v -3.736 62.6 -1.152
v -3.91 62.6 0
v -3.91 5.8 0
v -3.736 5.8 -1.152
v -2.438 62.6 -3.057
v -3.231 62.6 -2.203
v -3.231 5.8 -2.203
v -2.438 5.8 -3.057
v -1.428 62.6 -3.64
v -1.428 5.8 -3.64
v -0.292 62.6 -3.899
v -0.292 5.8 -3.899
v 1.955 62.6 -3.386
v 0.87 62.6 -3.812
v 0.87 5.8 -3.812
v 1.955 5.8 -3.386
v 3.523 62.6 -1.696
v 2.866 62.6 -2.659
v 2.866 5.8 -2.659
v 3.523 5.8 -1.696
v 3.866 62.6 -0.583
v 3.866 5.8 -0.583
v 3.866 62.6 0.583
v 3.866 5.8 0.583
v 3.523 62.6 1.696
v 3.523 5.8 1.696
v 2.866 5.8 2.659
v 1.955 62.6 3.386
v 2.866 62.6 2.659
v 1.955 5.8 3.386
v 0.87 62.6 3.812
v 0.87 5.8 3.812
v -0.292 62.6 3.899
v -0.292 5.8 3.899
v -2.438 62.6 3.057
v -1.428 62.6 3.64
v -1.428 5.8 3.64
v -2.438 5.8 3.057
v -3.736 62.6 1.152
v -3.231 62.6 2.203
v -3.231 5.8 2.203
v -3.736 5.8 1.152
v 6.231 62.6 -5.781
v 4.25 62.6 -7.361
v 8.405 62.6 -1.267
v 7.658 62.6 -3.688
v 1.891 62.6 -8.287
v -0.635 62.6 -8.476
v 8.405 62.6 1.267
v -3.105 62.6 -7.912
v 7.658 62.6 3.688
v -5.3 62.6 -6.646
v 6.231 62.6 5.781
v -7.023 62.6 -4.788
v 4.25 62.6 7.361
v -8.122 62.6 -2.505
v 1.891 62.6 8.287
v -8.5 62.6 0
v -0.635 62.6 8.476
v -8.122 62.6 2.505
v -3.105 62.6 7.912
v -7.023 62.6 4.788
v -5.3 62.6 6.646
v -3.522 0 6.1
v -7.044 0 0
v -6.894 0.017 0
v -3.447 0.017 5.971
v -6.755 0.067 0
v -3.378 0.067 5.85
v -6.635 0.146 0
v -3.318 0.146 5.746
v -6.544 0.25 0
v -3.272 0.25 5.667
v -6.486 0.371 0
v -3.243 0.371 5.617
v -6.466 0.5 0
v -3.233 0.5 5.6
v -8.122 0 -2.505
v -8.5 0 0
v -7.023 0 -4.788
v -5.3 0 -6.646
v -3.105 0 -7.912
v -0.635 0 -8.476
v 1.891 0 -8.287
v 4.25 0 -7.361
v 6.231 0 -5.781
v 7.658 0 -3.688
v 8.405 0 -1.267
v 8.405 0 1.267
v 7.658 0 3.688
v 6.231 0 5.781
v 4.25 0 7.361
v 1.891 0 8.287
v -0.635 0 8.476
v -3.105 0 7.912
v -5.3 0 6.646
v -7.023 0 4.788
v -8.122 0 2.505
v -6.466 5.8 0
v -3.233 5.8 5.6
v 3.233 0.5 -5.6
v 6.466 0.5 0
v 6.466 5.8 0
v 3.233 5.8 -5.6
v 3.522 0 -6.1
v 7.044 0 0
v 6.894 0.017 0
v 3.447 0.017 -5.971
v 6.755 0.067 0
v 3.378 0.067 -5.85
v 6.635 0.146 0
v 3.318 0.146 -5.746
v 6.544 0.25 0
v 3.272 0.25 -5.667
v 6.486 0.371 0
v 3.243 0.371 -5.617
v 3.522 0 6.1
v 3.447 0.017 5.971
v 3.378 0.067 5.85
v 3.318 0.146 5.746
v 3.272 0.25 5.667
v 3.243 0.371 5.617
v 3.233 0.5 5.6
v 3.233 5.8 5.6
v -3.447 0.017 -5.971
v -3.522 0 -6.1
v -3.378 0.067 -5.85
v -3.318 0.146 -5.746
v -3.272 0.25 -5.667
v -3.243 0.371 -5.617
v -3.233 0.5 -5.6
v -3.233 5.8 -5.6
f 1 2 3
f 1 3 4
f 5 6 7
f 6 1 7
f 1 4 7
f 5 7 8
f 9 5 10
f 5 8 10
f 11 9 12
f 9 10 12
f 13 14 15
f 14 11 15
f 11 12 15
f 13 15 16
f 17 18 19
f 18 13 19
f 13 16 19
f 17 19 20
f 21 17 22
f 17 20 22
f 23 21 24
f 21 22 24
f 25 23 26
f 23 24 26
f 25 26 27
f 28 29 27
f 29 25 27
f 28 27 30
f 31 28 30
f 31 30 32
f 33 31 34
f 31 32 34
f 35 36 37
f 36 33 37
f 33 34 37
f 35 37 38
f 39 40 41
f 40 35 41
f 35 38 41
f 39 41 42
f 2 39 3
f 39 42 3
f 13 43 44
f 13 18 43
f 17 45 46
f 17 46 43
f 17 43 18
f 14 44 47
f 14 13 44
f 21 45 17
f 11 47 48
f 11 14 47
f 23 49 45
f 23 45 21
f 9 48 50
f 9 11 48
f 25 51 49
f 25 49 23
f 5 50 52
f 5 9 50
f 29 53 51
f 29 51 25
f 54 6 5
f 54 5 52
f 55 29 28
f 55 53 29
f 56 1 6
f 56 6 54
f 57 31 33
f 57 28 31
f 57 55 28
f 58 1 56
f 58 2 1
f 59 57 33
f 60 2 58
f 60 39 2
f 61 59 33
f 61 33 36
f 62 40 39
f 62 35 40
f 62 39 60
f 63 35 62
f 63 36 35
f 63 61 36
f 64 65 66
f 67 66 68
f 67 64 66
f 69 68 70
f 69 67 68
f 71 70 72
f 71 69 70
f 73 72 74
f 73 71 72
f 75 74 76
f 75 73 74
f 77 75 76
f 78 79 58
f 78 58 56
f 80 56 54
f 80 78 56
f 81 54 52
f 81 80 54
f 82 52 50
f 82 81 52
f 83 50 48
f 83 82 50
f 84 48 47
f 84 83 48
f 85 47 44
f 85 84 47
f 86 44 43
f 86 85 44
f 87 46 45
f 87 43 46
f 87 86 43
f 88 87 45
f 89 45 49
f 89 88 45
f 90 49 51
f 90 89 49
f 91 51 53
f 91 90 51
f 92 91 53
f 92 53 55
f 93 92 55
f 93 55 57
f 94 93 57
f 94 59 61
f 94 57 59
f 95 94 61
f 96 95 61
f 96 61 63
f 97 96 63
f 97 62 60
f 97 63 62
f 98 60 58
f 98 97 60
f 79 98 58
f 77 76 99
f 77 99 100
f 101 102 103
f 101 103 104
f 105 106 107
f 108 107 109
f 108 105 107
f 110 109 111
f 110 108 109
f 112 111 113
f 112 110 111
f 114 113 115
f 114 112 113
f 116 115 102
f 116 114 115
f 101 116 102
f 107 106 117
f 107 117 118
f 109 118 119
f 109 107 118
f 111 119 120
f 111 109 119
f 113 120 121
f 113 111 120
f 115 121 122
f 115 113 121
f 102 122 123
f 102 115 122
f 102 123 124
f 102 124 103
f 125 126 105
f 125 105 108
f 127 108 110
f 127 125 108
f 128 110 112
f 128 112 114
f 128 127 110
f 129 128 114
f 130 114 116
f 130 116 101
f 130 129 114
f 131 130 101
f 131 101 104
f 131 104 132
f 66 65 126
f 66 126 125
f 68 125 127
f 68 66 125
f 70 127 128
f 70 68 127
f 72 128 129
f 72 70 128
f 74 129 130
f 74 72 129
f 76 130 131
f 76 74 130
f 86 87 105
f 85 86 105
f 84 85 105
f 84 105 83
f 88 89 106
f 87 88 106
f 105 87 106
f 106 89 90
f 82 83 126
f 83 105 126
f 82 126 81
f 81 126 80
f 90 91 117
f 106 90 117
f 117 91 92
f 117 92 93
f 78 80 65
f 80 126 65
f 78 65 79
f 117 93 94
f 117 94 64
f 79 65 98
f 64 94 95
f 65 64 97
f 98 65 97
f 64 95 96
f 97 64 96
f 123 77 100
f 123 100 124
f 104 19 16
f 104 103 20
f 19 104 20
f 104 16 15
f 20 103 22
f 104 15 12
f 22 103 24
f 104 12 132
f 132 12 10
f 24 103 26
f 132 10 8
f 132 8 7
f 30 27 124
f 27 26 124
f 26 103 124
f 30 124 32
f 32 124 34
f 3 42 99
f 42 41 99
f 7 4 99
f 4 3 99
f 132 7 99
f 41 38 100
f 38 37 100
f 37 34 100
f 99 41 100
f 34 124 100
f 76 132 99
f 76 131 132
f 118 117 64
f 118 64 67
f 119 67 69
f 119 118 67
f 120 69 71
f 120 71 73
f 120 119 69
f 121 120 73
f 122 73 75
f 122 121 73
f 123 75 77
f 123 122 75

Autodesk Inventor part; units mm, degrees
ref_plane "YZ Plane" through (0, 0, 0) normal (1, 0, 0) x (0, 1, 0)
ref_plane "XZ Plane" through (0, 0, 0) normal (0, 1, 0) x (-1, 0, 0)
ref_plane "XY Plane" through (0, 0, 0) normal (0, 0, 1) x (1, 0, 0)
sketch "Sketch1" plane through (0, 0, 0) normal (0, 1, 0) x (-1, 0, 0)
  circle A0 centre (0, 0) radius 3.91
  circle A1 centre (0, 0) radius 8.5
  line L0 (5.7735, 0) -> (2.8868, -5) construction
  line L1 (2.8868, -5) -> (-2.8868, -5) construction
  line L2 (-2.8868, -5) -> (-5.7735, 0) construction
  line L3 (-5.7735, 0) -> (-2.8868, 5) construction
  line L4 (-2.8868, 5) -> (2.8868, 5) construction
  line L5 (2.8868, 5) -> (5.7735, 0) construction
  line L6 (3.2332, -5.6) -> (6.4663, 0)
  line L7 (6.4663, 0) -> (3.2332, 5.6)
  line L8 (3.2332, 5.6) -> (-3.2332, 5.6)
  line L9 (-3.2332, 5.6) -> (-6.4663, 0)
  line L10 (-6.4663, 0) -> (-3.2332, -5.6)
  line L11 (-3.2332, -5.6) -> (3.2332, -5.6)
  dimension "d0" = 7.82
  dimension "d4" = 10
  dimension "d5" = 0.6
  dimension "d6" = 17
extrude "Extrusion1" add sketch "Sketch1" along normal blind 62.6 contours A1 | L11 L10 L9 L8 L7 L6
extrude "Extrusion2" cut sketch "Sketch1" along normal blind 5.8 contours L11 L10 L9 L8 L7 L6
fillet "Fillet1" radius 0.5 6 edges at (-4.8497, 0, -2.8) (0, 0, -5.6) (4.8497, 0, -2.8) (4.8497, 0, 2.8) (0, 0, 5.6) (-4.8497, 0, 2.8)
properties part number "GenevaPin" material "ABS Plastic"
